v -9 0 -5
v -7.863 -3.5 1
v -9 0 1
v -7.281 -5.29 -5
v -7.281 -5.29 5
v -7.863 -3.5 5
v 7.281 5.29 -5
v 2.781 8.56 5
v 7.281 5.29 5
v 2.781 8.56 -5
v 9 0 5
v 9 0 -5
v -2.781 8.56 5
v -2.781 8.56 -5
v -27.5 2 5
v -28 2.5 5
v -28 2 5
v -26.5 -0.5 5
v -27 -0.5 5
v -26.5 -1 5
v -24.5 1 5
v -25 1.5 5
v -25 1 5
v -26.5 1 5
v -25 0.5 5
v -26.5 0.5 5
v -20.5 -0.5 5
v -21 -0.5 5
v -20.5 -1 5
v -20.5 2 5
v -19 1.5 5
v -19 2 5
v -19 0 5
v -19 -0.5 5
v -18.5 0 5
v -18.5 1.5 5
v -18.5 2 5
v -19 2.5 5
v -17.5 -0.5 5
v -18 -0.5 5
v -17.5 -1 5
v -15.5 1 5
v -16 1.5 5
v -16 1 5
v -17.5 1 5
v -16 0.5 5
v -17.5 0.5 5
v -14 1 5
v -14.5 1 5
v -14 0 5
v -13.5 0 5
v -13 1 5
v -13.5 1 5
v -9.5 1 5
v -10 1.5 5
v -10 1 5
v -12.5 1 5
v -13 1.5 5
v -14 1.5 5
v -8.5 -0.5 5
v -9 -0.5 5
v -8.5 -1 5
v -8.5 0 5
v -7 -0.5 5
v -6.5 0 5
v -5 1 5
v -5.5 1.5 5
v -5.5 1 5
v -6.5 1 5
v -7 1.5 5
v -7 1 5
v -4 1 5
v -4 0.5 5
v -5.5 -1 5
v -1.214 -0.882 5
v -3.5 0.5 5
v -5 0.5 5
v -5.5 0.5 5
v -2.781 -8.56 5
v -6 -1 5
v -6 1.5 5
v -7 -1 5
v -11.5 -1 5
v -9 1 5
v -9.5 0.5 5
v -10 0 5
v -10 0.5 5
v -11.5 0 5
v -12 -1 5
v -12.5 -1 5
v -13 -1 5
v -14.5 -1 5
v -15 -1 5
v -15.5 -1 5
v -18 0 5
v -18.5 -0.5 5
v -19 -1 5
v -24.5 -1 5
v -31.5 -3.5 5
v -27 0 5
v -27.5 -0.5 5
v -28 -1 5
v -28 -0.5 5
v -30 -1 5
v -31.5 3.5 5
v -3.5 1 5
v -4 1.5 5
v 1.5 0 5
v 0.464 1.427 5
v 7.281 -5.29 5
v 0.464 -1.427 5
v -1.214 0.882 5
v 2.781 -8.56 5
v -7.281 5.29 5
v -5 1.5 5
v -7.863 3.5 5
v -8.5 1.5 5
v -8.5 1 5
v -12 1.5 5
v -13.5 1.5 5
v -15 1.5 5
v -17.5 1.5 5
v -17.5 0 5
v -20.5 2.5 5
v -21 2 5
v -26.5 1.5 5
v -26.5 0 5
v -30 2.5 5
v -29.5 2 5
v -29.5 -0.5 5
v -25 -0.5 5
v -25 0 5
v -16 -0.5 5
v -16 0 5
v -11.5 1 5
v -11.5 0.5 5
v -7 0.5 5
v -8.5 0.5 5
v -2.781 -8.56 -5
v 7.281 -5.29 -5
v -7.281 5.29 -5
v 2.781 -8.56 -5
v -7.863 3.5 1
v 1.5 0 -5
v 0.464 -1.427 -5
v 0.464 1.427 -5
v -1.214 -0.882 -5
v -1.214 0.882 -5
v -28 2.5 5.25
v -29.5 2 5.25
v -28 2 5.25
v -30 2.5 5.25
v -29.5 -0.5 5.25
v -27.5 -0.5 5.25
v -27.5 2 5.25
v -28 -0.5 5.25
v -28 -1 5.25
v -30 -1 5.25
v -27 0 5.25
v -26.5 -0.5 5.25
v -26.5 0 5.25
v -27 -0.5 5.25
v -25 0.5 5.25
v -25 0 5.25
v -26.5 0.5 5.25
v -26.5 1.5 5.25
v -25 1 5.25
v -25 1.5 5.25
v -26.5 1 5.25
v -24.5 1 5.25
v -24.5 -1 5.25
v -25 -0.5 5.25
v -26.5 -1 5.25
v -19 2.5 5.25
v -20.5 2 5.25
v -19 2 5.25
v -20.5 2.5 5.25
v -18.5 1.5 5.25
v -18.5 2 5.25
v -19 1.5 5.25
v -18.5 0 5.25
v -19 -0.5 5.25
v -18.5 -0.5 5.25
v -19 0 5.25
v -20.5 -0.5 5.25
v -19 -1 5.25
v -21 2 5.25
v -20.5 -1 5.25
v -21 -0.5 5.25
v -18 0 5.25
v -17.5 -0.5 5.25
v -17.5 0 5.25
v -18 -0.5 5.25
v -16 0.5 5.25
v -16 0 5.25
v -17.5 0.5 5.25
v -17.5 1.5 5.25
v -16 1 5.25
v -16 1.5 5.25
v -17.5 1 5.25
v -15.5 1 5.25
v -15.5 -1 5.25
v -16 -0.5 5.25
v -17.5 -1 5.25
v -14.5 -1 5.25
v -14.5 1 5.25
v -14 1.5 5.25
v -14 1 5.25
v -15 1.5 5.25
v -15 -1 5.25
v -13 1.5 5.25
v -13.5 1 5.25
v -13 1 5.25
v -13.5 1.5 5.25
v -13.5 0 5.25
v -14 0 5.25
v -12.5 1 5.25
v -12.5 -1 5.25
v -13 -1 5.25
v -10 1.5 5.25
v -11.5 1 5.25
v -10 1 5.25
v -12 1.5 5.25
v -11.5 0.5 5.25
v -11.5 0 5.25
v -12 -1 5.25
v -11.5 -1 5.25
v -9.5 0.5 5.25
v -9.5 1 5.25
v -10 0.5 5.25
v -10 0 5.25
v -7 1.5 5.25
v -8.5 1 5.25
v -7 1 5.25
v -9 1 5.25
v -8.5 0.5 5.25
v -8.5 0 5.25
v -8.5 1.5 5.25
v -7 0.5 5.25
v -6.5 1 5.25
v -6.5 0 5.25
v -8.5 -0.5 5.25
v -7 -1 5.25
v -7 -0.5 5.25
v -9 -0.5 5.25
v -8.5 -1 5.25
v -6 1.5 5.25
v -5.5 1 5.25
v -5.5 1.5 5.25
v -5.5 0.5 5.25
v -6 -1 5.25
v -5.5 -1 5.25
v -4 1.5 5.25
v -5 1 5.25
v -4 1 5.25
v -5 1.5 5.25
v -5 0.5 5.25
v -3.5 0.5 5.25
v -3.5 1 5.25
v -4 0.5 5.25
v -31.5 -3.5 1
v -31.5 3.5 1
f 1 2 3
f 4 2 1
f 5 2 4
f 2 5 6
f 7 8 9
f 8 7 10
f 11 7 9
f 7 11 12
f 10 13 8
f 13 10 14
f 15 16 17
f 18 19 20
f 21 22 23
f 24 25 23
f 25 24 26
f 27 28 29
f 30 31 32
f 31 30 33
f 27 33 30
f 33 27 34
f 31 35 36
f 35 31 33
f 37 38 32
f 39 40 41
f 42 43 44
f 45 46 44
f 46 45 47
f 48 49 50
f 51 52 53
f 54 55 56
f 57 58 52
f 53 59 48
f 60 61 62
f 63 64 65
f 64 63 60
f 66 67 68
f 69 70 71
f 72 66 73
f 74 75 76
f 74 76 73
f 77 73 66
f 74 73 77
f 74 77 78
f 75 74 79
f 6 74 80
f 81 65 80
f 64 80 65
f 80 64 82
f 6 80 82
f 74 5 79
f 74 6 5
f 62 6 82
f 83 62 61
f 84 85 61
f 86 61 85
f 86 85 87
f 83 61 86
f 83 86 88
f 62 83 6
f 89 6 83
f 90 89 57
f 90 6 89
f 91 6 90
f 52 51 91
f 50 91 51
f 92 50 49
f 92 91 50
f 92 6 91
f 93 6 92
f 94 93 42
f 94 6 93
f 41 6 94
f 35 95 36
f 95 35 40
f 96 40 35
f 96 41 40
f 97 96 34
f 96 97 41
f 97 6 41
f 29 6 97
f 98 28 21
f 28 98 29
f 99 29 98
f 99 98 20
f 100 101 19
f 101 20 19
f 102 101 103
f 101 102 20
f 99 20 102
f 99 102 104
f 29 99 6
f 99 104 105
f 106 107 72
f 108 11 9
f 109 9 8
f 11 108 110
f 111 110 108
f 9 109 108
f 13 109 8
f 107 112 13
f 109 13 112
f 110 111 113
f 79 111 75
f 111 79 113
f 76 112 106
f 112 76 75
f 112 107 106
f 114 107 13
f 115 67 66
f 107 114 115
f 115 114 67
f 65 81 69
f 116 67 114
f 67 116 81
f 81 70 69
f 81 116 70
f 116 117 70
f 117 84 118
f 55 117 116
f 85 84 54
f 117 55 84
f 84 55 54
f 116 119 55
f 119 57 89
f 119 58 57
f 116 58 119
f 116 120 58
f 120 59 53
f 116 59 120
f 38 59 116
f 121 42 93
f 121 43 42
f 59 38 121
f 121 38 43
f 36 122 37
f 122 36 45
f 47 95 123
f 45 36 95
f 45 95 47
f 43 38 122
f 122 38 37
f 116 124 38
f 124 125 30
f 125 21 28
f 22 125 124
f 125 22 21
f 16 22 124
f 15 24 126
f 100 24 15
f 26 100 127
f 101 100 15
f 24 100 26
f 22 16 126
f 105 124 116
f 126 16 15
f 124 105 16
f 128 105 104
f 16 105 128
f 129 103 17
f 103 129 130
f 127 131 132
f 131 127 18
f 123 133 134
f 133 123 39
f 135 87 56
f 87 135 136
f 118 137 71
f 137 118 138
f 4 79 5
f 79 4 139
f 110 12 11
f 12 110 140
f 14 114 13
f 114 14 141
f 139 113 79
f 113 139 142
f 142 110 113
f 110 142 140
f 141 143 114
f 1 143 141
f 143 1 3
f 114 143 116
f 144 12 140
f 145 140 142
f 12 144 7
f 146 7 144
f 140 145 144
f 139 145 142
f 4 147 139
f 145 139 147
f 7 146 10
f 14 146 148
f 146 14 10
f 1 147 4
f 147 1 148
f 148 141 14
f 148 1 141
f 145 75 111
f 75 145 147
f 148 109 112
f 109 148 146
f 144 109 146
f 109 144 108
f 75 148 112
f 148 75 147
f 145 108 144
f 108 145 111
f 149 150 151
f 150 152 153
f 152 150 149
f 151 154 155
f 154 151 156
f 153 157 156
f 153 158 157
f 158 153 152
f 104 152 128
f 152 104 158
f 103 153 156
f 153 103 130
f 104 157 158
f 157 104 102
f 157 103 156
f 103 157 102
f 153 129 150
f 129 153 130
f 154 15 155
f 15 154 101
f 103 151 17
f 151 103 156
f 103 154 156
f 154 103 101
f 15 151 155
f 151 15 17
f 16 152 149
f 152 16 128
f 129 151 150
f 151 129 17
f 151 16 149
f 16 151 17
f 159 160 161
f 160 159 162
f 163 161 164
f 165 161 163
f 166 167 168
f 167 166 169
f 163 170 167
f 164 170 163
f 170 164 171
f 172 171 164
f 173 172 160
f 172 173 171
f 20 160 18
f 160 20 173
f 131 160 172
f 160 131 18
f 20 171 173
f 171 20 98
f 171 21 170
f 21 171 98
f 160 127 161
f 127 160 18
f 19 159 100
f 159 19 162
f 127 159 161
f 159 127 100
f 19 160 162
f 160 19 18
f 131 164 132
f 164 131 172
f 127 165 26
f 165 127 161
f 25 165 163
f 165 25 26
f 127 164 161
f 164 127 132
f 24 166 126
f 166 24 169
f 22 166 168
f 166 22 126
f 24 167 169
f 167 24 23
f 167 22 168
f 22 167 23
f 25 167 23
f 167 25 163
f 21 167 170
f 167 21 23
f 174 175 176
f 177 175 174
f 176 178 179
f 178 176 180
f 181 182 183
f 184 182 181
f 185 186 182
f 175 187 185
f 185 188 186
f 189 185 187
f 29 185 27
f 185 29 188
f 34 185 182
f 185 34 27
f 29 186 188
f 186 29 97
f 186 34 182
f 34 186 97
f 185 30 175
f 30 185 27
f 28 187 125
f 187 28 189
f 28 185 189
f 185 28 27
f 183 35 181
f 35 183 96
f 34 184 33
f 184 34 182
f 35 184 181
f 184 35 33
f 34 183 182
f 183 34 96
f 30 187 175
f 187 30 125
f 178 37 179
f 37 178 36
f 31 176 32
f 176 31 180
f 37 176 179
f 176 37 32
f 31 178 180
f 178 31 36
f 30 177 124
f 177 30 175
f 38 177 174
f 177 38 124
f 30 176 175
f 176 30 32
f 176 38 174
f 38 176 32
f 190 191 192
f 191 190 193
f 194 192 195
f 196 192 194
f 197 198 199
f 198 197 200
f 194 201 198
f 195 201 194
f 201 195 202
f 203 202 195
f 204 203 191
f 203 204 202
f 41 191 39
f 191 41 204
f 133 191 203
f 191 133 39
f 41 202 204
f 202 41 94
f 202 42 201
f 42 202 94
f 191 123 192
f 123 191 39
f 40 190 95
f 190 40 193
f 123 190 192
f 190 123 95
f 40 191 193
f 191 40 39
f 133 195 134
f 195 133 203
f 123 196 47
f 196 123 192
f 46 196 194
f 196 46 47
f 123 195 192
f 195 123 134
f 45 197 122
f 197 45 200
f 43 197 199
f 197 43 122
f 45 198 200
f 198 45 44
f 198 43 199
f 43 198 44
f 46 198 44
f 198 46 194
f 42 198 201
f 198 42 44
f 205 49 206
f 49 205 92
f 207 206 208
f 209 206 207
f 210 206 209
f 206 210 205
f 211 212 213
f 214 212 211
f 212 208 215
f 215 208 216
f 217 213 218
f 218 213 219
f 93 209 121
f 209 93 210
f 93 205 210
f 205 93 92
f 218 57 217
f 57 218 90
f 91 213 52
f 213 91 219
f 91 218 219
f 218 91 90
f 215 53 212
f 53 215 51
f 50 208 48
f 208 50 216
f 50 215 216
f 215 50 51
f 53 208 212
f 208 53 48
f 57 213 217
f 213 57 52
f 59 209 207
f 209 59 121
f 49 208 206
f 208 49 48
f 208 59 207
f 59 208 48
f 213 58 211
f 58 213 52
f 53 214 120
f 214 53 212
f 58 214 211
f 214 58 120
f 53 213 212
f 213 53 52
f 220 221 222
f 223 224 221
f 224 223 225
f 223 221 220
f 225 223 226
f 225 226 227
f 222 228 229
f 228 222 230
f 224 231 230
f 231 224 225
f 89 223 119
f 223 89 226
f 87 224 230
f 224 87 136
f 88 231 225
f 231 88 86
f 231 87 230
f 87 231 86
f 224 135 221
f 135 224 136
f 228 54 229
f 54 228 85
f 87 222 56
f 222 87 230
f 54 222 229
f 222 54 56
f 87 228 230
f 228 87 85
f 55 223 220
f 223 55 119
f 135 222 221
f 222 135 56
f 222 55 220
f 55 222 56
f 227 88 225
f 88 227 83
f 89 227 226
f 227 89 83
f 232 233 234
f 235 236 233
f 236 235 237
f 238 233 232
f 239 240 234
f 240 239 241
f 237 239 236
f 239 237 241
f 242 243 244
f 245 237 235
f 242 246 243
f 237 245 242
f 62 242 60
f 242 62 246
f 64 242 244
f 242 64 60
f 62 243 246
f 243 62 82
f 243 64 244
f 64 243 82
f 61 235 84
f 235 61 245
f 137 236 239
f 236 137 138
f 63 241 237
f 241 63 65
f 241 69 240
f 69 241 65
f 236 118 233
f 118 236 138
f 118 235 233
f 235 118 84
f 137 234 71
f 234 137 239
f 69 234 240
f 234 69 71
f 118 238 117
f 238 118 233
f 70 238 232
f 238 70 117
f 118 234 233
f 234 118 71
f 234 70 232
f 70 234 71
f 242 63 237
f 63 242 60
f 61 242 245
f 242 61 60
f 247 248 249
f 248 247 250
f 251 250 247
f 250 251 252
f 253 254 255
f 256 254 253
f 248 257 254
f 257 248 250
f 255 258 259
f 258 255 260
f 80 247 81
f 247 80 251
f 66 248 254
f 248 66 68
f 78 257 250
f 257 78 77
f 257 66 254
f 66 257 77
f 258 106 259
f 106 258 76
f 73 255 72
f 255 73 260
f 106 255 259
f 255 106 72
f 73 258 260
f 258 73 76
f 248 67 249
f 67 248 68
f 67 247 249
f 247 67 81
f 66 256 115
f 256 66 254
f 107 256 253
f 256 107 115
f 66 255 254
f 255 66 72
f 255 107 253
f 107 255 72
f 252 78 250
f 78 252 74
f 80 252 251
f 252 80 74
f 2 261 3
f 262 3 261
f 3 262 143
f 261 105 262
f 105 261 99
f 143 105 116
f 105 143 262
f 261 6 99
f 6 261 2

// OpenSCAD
//How large the bolt holes are
boltRadius=1.5;//[1:5]
//How many bolt hole sides there are (roudness)
boltHoleSides=5;//[3:20] 
//How large in radius (half the circle size)
boltMountRadius=9;//[5:25]
//How round the round portion of the lock is 4 = square
boltMountRoundness=10;//[4:50] 
//How tall the round portion of the lock is where the bolt screws into
boltMountHeight=10;//[10:25] 
//How tall the flip bar is on the lock
flipMountHeight=4;//[2:10]
//How wide the flip bar is on the lock
flipMountWidth=7;//[4:15]
//How long the flip bar is on the lock
flipMountLength=25;//[15:30] 
//The offset for hole creations, sizes smaller then this will leave a thin layer that could cause issues with printing. 
holeCreationOffset=0.02; //[0.01:0.03]
//The size of the text on the object
textSize=.5;//[.25,.5,.75,1]
//The text to display on the fliplock
locktext="Da Camper";
//Whether or not to enable the letters on the lock.
enableText=true; //[true:false] 
module flipMount(){
    union() {
        
        difference(){
            cylinder(h = boltMountHeight, r =boltMountRadius, center = true, $fn = boltMountRoundness);
            cylinder(h = boltMountHeight + holeCreationOffset, r =boltRadius, center = true, $fn = boltHoleSides);
            }
            
        translate([-boltMountRadius - (flipMountLength * .4), 0, (boltMountHeight / 2) - (flipMountHeight / 2) ]) cube([flipMountLength, flipMountWidth, flipMountHeight], center=true);
    
    if (enableText){
        translate([-boltMountRadius - flipMountLength + 4, -textSize * 2, (boltMountHeight / 2) - (textSize / 2) ]) scale([textSize,textSize,textSize]) drawtext(locktext);
    }
    }
}


module drawtext(text) {
	//Characters
	chars = " !\"#$%&'()*+,-./0123456789:;<=>?@ABCDEFGHIJKLMNOPQRSTUVWXYZ[\\]^_`abcdefghijklmnopqrstuvwxyz{|}";

	//Chracter table defining 5x7 characters
	//Adapted from: http://www.geocities.com/dinceraydin/djlcdsim/chartable.js
	char_table = [ [ 0, 0, 0, 0, 0, 0, 0],
                  [ 4, 0, 4, 4, 4, 4, 4],
                  [ 0, 0, 0, 0,10,10,10],
                  [10,10,31,10,31,10,10],
                  [ 4,30, 5,14,20,15, 4],
                  [ 3,19, 8, 4, 2,25,24],
                  [13,18,21, 8,20,18,12],
                  [ 0, 0, 0, 0, 8, 4,12],
                  [ 2, 4, 8, 8, 8, 4, 2],
                  [ 8, 4, 2, 2, 2, 4, 8],
                  [ 0, 4,21,14,21, 4, 0],
                  [ 0, 4, 4,31, 4, 4, 0],
                  [ 8, 4,12, 0, 0, 0, 0],
                  [ 0, 0, 0,31, 0, 0, 0],
                  [12,12, 0, 0, 0, 0, 0],
                  [ 0,16, 8, 4, 2, 1, 0],
                  [14,17,25,21,19,17,14],
                  [14, 4, 4, 4, 4,12, 4],
                  [31, 8, 4, 2, 1,17,14],
                  [14,17, 1, 2, 4, 2,31],
                  [ 2, 2,31,18,10, 6, 2],
                  [14,17, 1, 1,30,16,31],
                  [14,17,17,30,16, 8, 6],
                  [ 8, 8, 8, 4, 2, 1,31],
                  [14,17,17,14,17,17,14],
                  [12, 2, 1,15,17,17,14],
                  [ 0,12,12, 0,12,12, 0],
                  [ 8, 4,12, 0,12,12, 0],
                  [ 2, 4, 8,16, 8, 4, 2],
                  [ 0, 0,31, 0,31, 0, 0],
                  [16, 8, 4, 2, 4, 8,16],
                  [ 4, 0, 4, 2, 1,17,14],
                  [14,21,21,13, 1,17,14],
                  [17,17,31,17,17,17,14],
                  [30,17,17,30,17,17,30],
                  [14,17,16,16,16,17,14],
                  [30,17,17,17,17,17,30],
                  [31,16,16,30,16,16,31],
                  [16,16,16,30,16,16,31],
                  [15,17,17,23,16,17,14],
                  [17,17,17,31,17,17,17],
                  [14, 4, 4, 4, 4, 4,14],
                  [12,18, 2, 2, 2, 2, 7],
                  [17,18,20,24,20,18,17],
                  [31,16,16,16,16,16,16],
                  [17,17,17,21,21,27,17],
                  [17,17,19,21,25,17,17],
                  [14,17,17,17,17,17,14],
                  [16,16,16,30,17,17,30],
                  [13,18,21,17,17,17,14],
                  [17,18,20,30,17,17,30],
                  [30, 1, 1,14,16,16,15],
                  [ 4, 4, 4, 4, 4, 4,31],
                  [14,17,17,17,17,17,17],
                  [ 4,10,17,17,17,17,17],
                  [10,21,21,21,17,17,17],
                  [17,17,10, 4,10,17,17],
                  [ 4, 4, 4,10,17,17,17],
                  [31,16, 8, 4, 2, 1,31],
                  [14, 8, 8, 8, 8, 8,14],
                  [ 0, 1, 2, 4, 8,16, 0],
                  [14, 2, 2, 2, 2, 2,14],
                  [ 0, 0, 0, 0,17,10, 4],
                  [31, 0, 0, 0, 0, 0, 0],
                  [ 0, 0, 0, 0, 2, 4, 8],
                  [15,17,15, 1,14, 0, 0],
                  [30,17,17,25,22,16,16],
                  [14,17,16,16,14, 0, 0],
                  [15,17,17,19,13, 1, 1],
                  [14,16,31,17,14, 0, 0],
                  [ 8, 8, 8,28, 8, 9, 6],
                  [14, 1,15,17,15, 0, 0],
                  [17,17,17,25,22,16,16],
                  [14, 4, 4, 4,12, 0, 4],
                  [12,18, 2, 2, 2, 6, 2],
                  [18,20,24,20,18,16,16],
                  [14, 4, 4, 4, 4, 4,12],
                  [17,17,21,21,26, 0, 0],
                  [17,17,17,25,22, 0, 0],
                  [14,17,17,17,14, 0, 0],
                  [16,16,30,17,30, 0, 0],
                  [ 1, 1,15,19,13, 0, 0],
                  [16,16,16,25,22, 0, 0],
                  [30, 1,14,16,15, 0, 0],
                  [ 6, 9, 8, 8,28, 8, 8],
                  [13,19,17,17,17, 0, 0],
                  [ 4,10,17,17,17, 0, 0],
                  [10,21,21,17,17, 0, 0],
                  [17,10, 4,10,17, 0, 0],
                  [14, 1,15,17,17, 0, 0],
                  [31, 8, 4, 2,31, 0, 0],
                  [ 2, 4, 4, 8, 4, 4, 2],
                  [ 4, 4, 4, 4, 4, 4, 4],
                  [ 8, 4, 4, 2, 4, 4, 8] ];

	//Binary decode table
	dec_table = [ "00000", "00001", "00010", "00011", "00100", "00101",
  	            "00110", "00111", "01000", "01001", "01010", "01011",
  	            "01100", "01101", "01110", "01111", "10000", "10001",
  	            "10010", "10011", "10100", "10101", "10110", "10111",
	            "11000", "11001", "11010", "11011", "11100", "11101",
	            "11110", "11111" ];

	//Process string one character at a time
	for(itext = [0:len(text)-1]) {
		//Convert character to index
		assign(ichar = search(text[itext],chars,1)[0]) {
			//Decode character - rows
			for(irow = [0:6]) {
				assign(val = dec_table[char_table[ichar][irow]]) {
					//Decode character - cols
					for(icol = [0:4]) {
						assign(bit = search(val[icol],"01",1)[0]) {
							if(bit) {
								//Output cube
								translate([icol + (6*itext), irow, 0])
									cube([1.0001,1.0001,1]);
							}
						}
					}
				}
			}
		}
	}
}

flipMount();
